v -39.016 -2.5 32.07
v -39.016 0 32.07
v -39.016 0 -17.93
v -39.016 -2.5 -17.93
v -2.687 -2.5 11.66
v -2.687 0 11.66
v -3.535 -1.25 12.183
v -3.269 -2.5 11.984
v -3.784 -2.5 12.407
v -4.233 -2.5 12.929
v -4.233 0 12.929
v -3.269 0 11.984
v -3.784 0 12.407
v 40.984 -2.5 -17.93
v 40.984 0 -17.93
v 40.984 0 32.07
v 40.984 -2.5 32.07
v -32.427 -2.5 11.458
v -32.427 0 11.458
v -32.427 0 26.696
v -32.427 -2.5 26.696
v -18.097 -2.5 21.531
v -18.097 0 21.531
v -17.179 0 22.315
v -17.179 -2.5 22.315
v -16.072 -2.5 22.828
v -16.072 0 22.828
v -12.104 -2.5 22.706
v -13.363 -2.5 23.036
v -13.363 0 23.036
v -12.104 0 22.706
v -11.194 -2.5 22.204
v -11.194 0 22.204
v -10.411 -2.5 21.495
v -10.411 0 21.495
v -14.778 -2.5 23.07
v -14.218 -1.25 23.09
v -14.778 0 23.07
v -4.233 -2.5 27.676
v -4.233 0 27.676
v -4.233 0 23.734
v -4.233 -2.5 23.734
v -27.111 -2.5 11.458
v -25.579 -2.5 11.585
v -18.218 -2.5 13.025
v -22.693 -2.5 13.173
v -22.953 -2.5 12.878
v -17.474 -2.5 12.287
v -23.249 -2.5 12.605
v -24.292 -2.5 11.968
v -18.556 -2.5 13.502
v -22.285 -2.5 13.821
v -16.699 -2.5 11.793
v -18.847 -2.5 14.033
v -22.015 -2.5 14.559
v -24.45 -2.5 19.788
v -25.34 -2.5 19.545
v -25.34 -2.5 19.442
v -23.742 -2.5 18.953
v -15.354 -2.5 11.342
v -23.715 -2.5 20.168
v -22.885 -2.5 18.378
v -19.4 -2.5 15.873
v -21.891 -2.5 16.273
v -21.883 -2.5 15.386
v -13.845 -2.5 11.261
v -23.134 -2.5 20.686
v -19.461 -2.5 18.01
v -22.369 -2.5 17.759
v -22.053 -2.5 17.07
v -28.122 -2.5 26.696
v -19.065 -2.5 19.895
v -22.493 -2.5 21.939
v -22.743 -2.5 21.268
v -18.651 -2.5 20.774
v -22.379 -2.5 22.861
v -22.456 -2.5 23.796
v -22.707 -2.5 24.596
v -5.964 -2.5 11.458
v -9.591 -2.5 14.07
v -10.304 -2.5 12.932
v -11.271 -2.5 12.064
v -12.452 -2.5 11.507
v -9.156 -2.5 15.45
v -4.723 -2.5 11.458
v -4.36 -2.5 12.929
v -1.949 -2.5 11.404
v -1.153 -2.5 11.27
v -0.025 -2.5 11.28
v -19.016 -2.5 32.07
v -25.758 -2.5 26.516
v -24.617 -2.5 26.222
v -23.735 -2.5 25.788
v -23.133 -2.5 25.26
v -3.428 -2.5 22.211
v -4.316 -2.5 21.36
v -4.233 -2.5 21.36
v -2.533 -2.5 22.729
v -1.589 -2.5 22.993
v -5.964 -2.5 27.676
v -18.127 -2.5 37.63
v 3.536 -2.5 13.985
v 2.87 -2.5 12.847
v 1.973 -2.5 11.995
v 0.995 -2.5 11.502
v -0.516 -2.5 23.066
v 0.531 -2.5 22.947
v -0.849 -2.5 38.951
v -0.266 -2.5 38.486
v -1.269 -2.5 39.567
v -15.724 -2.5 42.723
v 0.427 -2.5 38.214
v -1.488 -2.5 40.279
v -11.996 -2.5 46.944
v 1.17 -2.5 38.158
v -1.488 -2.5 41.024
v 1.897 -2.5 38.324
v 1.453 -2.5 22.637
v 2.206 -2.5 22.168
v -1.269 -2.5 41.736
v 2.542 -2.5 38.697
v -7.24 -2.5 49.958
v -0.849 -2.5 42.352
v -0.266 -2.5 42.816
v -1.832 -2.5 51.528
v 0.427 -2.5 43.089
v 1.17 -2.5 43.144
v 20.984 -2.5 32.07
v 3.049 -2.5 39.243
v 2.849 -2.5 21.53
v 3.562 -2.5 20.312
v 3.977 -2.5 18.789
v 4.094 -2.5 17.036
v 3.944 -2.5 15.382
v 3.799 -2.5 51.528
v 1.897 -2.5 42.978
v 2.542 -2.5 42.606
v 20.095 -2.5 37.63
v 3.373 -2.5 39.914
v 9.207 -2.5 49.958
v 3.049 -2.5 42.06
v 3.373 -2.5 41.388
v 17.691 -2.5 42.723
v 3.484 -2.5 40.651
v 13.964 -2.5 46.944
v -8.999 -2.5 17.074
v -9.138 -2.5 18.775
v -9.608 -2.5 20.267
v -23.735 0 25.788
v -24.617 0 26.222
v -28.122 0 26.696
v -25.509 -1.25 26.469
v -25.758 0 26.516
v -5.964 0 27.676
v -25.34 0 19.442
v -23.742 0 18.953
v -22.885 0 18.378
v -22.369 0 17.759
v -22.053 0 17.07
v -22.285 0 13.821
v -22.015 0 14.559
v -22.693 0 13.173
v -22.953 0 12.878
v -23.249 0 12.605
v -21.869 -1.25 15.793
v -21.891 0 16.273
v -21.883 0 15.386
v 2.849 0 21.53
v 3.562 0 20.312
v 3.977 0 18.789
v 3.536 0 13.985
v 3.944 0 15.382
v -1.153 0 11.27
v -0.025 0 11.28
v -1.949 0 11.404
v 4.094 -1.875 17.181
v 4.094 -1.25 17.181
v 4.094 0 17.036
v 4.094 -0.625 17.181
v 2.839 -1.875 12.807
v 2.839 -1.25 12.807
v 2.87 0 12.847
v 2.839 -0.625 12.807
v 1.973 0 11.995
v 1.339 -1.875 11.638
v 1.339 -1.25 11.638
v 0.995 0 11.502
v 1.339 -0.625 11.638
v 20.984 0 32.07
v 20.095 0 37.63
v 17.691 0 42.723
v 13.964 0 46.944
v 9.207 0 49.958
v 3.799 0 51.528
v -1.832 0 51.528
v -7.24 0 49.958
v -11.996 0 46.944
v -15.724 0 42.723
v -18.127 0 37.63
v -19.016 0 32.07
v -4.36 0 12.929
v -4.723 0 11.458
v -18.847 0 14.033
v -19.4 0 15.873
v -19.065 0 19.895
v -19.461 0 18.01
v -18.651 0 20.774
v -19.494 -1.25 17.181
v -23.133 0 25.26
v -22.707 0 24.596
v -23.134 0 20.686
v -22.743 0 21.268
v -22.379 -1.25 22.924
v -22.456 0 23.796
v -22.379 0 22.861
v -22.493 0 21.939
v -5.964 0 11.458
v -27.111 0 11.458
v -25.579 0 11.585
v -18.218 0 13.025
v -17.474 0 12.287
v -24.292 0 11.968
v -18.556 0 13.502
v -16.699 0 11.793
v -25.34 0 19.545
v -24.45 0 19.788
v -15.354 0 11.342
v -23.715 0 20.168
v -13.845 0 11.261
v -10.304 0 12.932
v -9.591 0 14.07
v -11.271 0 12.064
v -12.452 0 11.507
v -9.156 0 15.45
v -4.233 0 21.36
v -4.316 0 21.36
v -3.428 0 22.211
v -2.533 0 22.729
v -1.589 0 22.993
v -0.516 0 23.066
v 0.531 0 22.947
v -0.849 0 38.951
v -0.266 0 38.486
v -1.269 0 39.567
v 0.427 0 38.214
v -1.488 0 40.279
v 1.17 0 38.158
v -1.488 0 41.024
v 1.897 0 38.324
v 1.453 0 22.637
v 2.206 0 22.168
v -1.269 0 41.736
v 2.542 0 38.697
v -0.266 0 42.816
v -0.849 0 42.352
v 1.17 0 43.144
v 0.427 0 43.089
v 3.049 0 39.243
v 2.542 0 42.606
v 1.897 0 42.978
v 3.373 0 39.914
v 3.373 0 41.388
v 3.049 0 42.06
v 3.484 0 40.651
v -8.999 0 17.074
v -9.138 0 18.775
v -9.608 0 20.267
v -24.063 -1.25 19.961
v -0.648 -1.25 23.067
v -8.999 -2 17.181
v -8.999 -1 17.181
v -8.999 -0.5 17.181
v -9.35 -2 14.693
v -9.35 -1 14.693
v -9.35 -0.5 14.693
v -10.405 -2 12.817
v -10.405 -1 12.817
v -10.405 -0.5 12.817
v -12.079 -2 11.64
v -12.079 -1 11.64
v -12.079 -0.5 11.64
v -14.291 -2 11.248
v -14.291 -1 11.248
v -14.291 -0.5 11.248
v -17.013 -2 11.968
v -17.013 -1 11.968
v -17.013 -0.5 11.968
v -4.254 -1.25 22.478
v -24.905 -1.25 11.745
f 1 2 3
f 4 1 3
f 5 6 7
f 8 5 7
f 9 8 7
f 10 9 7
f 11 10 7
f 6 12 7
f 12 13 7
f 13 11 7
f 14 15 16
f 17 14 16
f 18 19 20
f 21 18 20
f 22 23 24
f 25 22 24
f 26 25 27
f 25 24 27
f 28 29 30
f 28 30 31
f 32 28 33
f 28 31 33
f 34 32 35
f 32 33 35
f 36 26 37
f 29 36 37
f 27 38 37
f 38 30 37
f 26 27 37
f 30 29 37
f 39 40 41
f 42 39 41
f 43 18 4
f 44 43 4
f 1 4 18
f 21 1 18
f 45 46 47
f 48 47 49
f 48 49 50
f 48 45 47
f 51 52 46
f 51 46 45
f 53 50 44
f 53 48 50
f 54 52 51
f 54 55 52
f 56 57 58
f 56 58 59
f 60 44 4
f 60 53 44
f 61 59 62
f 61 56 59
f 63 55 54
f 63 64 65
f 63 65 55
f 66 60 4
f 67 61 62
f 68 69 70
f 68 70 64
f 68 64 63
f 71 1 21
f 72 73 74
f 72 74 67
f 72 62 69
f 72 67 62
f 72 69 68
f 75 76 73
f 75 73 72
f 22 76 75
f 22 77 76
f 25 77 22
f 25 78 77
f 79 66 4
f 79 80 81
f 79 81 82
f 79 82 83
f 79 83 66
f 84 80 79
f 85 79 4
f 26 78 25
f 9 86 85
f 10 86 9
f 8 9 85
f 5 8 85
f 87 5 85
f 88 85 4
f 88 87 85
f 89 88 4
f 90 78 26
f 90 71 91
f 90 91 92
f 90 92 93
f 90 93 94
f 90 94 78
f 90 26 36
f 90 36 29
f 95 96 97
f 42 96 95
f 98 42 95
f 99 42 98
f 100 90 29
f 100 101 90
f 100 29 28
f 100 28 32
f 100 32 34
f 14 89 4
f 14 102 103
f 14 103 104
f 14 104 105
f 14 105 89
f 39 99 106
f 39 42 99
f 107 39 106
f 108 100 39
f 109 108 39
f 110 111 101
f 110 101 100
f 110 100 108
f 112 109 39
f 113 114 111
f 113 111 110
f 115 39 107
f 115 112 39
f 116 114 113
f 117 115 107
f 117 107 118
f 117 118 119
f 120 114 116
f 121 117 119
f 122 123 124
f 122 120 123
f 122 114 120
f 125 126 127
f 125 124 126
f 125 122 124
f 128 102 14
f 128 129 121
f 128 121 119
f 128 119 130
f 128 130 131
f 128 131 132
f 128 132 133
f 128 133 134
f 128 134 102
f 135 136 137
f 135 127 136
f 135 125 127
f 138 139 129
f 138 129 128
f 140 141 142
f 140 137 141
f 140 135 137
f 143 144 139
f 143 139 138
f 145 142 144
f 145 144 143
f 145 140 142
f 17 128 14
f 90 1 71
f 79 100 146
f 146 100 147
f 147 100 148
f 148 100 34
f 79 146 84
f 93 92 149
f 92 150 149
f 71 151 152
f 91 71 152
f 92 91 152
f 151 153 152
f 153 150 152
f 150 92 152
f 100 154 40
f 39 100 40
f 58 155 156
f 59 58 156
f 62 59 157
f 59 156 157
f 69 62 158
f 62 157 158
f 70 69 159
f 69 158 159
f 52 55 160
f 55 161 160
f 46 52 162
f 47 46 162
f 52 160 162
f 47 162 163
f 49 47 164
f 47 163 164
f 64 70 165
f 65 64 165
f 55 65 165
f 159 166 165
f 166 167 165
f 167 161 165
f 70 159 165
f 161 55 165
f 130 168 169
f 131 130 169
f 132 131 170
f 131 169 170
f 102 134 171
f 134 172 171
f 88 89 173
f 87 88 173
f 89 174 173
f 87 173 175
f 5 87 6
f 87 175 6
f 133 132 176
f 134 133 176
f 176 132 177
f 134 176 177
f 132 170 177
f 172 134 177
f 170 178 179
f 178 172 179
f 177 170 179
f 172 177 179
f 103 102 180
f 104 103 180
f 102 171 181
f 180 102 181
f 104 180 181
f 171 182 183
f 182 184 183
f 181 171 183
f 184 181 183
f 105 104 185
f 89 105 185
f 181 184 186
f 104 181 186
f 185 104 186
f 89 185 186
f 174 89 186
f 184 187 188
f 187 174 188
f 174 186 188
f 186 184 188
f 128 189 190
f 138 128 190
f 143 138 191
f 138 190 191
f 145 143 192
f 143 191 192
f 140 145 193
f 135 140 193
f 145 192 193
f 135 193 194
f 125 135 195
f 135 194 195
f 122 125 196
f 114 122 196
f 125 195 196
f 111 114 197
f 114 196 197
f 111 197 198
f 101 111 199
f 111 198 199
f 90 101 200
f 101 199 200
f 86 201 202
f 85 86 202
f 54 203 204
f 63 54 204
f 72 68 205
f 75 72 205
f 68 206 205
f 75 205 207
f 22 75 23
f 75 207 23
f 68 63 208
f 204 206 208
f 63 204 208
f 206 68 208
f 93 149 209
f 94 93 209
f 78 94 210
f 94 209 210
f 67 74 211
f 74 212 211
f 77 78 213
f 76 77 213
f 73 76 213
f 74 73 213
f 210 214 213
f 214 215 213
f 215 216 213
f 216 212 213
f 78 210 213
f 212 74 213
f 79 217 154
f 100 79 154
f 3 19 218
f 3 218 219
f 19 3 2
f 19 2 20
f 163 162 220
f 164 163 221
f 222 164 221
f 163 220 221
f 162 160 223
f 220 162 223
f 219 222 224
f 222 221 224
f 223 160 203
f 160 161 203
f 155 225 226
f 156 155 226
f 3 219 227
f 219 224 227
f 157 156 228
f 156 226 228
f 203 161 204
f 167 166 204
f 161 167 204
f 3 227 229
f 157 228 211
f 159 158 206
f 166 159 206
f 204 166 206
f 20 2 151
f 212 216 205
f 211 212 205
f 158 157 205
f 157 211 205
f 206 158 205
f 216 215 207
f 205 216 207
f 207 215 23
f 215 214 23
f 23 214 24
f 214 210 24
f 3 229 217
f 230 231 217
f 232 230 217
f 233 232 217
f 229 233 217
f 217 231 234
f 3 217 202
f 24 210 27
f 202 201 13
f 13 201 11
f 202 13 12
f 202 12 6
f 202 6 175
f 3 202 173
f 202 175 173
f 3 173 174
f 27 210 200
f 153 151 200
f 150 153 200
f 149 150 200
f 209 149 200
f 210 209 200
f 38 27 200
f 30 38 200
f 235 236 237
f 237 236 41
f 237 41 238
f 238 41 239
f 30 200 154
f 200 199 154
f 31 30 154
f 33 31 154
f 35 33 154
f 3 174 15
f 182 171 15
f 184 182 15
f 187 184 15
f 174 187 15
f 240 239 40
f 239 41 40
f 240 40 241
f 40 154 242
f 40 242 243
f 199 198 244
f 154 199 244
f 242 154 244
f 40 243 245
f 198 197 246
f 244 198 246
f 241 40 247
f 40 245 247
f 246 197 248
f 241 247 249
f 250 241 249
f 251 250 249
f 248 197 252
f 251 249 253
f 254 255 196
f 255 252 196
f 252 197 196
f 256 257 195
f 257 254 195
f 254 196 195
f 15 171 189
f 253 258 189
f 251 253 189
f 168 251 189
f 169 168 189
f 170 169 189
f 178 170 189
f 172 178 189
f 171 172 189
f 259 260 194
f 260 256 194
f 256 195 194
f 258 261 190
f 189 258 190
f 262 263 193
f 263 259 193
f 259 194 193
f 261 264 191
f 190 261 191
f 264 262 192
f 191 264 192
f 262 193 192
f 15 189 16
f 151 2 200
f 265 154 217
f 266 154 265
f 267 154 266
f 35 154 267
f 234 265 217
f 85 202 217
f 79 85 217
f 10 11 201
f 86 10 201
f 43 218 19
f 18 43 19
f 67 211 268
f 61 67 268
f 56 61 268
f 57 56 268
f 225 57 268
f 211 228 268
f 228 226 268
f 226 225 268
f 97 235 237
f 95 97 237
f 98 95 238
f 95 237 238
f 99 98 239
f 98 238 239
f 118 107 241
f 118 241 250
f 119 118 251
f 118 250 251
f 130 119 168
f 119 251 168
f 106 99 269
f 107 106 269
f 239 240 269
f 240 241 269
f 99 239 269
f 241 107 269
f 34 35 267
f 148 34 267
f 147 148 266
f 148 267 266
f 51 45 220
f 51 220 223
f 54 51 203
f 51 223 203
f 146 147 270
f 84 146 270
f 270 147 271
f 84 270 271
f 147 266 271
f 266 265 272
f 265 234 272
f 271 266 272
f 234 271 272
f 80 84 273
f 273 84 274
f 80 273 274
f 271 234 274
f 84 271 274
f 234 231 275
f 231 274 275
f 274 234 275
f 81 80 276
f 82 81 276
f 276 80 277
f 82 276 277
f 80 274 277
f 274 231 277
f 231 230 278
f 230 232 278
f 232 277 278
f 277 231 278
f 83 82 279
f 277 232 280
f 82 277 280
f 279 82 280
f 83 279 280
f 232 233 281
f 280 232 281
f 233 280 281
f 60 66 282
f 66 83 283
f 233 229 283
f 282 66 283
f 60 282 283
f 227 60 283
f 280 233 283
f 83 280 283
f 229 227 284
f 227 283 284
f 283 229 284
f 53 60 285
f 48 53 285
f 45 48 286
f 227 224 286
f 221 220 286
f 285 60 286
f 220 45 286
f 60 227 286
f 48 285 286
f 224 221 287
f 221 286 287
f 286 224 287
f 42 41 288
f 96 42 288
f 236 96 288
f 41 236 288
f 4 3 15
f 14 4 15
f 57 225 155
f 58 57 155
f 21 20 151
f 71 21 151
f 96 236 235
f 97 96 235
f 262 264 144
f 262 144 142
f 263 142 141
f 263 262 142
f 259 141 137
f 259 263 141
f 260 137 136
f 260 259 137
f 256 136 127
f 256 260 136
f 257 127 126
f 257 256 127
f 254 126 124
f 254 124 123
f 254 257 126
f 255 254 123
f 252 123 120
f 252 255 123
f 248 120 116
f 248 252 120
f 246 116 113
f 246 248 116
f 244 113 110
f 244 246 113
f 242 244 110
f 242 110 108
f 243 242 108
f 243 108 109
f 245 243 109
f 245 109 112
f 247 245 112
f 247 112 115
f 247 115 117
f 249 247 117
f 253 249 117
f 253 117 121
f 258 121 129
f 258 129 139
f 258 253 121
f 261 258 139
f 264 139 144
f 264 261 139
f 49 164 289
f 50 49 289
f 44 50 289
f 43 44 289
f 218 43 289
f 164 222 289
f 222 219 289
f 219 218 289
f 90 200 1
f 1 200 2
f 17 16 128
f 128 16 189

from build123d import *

# Parameters (mm, degrees)
F0_R     = 2.5
F1_DEPTH = 2.5


with BuildPart() as f1:
    # F0 (on Front) → F1 (new body)
    with BuildSketch(Plane.XZ):
        with BuildLine():
            Line((-39.0163958073, 32.069671154), (-39.0163958073, -17.930328846))
            Line((-39.0163958073, -17.930328846), (40.9836041927, -17.930328846))
            Line((40.9836041927, -17.930328846), (40.9836041927, 32.069671154))
            Line((40.9836041927, 32.069671154), (20.9836041927, 32.069671154))
            ThreePointArc((20.9836041927, 32.069671154), (0.9836041927, 51.7268625575), (-19.0163958073, 32.069671154))
            Line((-19.0163958073, 32.069671154), (-39.0163958073, 32.069671154))
        make_face()
        with BuildLine():
            Line((-32.4271805924, 11.4579676845), (-32.4271805924, 26.6955864939))
            Line((-32.4271805924, 26.6955864939), (-28.121694516, 26.6955864939))
            add(Edge.make_bspline(
                [(-28.121694516, 26.6955864939), (-25.0901787581, 26.6955864939), (-23.7345009192, 25.7884662672)],
                knots=[0, 0, 0, 1, 1, 1], degree=2))
            add(Edge.make_bspline(
                [(-23.7345009192, 25.7884662672), (-22.3788230803, 24.8813460404), (-22.3788230803, 22.923700551)],
                knots=[0, 0, 0, 1, 1, 1], degree=2))
            add(Edge.make_bspline(
                [(-22.3788230803, 22.923700551), (-22.3788230803, 21.5663552116), (-23.1342007691, 20.6859149915)],
                knots=[0, 0, 0, 1, 1, 1], degree=2))
            add(Edge.make_bspline(
                [(-23.1342007691, 20.6859149915), (-23.889578458, 19.8054747714), (-25.3403038207, 19.5453447064)],
                knots=[0, 0, 0, 1, 1, 1], degree=2))
            Line((-25.3403038207, 19.5453447064), (-25.3403038207, 19.4419596805))
            add(Edge.make_bspline(
                [(-25.3403038207, 19.4419596805), (-21.8685679527, 18.8483295321), (-21.8685679527, 15.7934687684)],
                knots=[0, 0, 0, 1, 1, 1], degree=2))
            add(Edge.make_bspline(
                [(-21.8685679527, 15.7934687684), (-21.8685679527, 13.7524482582), (-23.2492582979, 12.6052079713)],
                knots=[0, 0, 0, 1, 1, 1], degree=2))
            add(Edge.make_bspline(
                [(-23.2492582979, 12.6052079713), (-24.6299486431, 11.4579676845), (-27.1111892634, 11.4579676845)],
                knots=[0, 0, 0, 1, 1, 1], degree=2))
            Line((-27.1111892634, 11.4579676845), (-32.4271805924, 11.4579676845))
        make_face(mode=Mode.SUBTRACT)
        with BuildLine():
            add(Edge.make_bspline(
                [(-10.4111725884, 21.4946526937), (-8.9987997353, 19.8988547948), (-8.9987997353, 17.1808291152)],
                knots=[0, 0, 0, 1, 1, 1], degree=2))
            add(Edge.make_bspline(
                [(-8.9987997353, 17.1808291152), (-8.9987997353, 14.3860984166), (-10.4045025867, 12.8169805243)],
                knots=[0, 0, 0, 1, 1, 1], degree=2))
            add(Edge.make_bspline(
                [(-10.4045025867, 12.8169805243), (-11.8102054381, 11.247862632), (-14.2914460585, 11.247862632)],
                knots=[0, 0, 0, 1, 1, 1], degree=2))
            add(Edge.make_bspline(
                [(-14.2914460585, 11.247862632), (-15.825546442, 11.247862632), (-17.0128067388, 11.9682228121)],
                knots=[0, 0, 0, 1, 1, 1], degree=2))
            add(Edge.make_bspline(
                [(-17.0128067388, 11.9682228121), (-18.2000670356, 12.6885829922), (-18.8470571974, 14.0325883282)],
                knots=[0, 0, 0, 1, 1, 1], degree=2))
            add(Edge.make_bspline(
                [(-18.8470571974, 14.0325883282), (-19.4940473591, 15.3765936642), (-19.4940473591, 17.1808291152)],
                knots=[0, 0, 0, 1, 1, 1], degree=2))
            add(Edge.make_bspline(
                [(-19.4940473591, 17.1808291152), (-19.4940473591, 19.9722248131), (-18.0966820098, 21.5313377029)],
                knots=[0, 0, 0, 1, 1, 1], degree=2))
            add(Edge.make_bspline(
                [(-18.0966820098, 21.5313377029), (-16.6993166604, 23.0904505927), (-14.2180760401, 23.0904505927)],
                knots=[0, 0, 0, 1, 1, 1], degree=2))
            add(Edge.make_bspline(
                [(-14.2180760401, 23.0904505927), (-11.8235454415, 23.0904505927), (-10.4111725884, 21.4946526937)],
                knots=[0, 0, 0, 1, 1, 1], degree=2))
        make_face(mode=Mode.SUBTRACT)
        with BuildLine():
            add(Edge.make_bspline(
                [(-4.2330835439, 21.3595851599), (-3.025813242, 23.0671055868), (-0.6479576476, 23.0671055868)],
                knots=[0, 0, 0, 1, 1, 1], degree=2))
            add(Edge.make_bspline(
                [(-0.6479576476, 23.0671055868), (1.6031679152, 23.0671055868), (2.8487907266, 21.5296702025)],
                knots=[0, 0, 0, 1, 1, 1], degree=2))
            add(Edge.make_bspline(
                [(2.8487907266, 21.5296702025), (4.094413538, 19.9922348181), (4.094413538, 17.1808291152)],
                knots=[0, 0, 0, 1, 1, 1], degree=2))
            add(Edge.make_bspline(
                [(4.094413538, 17.1808291152), (4.094413538, 14.3660884116), (2.8387857241, 12.8069755218)],
                knots=[0, 0, 0, 1, 1, 1], degree=2))
            add(Edge.make_bspline(
                [(2.8387857241, 12.8069755218), (1.5831579102, 11.247862632), (-0.6479576476, 11.247862632)],
                knots=[0, 0, 0, 1, 1, 1], degree=2))
            add(Edge.make_bspline(
                [(-0.6479576476, 11.247862632), (-1.7651829269, 11.247862632), (-2.6873106574, 11.659735235)],
                knots=[0, 0, 0, 1, 1, 1], degree=2))
            add(Edge.make_bspline(
                [(-2.6873106574, 11.659735235), (-3.6094383879, 12.0716078379), (-4.2330835439, 12.9287030522)],
                knots=[0, 0, 0, 1, 1, 1], degree=2))
            Line((-4.2330835439, 12.9287030522), (-4.3598135755, 12.9287030522))
            Line((-4.3598135755, 12.9287030522), (-4.7233286664, 11.4579676845))
            Line((-4.7233286664, 11.4579676845), (-5.9639489766, 11.4579676845))
            Line((-5.9639489766, 11.4579676845), (-5.9639489766, 27.6760767391))
            Line((-5.9639489766, 27.6760767391), (-4.2330835439, 27.6760767391))
            Line((-4.2330835439, 27.6760767391), (-4.2330835439, 23.7341057536))
            add(Edge.make_bspline(
                [(-4.2330835439, 23.7341057536), (-4.2330835439, 22.4101104226), (-4.3164585647, 21.3595851599)],
                knots=[0, 0, 0, 1, 1, 1], degree=2))
            Line((-4.3164585647, 21.3595851599), (-4.2330835439, 21.3595851599))
        make_face(mode=Mode.SUBTRACT)
        with Locations((0.9836041927, 40.6512729824)):
            Circle(F0_R, mode=Mode.SUBTRACT)
    extrude(amount=F1_DEPTH)


solid = f1.part
